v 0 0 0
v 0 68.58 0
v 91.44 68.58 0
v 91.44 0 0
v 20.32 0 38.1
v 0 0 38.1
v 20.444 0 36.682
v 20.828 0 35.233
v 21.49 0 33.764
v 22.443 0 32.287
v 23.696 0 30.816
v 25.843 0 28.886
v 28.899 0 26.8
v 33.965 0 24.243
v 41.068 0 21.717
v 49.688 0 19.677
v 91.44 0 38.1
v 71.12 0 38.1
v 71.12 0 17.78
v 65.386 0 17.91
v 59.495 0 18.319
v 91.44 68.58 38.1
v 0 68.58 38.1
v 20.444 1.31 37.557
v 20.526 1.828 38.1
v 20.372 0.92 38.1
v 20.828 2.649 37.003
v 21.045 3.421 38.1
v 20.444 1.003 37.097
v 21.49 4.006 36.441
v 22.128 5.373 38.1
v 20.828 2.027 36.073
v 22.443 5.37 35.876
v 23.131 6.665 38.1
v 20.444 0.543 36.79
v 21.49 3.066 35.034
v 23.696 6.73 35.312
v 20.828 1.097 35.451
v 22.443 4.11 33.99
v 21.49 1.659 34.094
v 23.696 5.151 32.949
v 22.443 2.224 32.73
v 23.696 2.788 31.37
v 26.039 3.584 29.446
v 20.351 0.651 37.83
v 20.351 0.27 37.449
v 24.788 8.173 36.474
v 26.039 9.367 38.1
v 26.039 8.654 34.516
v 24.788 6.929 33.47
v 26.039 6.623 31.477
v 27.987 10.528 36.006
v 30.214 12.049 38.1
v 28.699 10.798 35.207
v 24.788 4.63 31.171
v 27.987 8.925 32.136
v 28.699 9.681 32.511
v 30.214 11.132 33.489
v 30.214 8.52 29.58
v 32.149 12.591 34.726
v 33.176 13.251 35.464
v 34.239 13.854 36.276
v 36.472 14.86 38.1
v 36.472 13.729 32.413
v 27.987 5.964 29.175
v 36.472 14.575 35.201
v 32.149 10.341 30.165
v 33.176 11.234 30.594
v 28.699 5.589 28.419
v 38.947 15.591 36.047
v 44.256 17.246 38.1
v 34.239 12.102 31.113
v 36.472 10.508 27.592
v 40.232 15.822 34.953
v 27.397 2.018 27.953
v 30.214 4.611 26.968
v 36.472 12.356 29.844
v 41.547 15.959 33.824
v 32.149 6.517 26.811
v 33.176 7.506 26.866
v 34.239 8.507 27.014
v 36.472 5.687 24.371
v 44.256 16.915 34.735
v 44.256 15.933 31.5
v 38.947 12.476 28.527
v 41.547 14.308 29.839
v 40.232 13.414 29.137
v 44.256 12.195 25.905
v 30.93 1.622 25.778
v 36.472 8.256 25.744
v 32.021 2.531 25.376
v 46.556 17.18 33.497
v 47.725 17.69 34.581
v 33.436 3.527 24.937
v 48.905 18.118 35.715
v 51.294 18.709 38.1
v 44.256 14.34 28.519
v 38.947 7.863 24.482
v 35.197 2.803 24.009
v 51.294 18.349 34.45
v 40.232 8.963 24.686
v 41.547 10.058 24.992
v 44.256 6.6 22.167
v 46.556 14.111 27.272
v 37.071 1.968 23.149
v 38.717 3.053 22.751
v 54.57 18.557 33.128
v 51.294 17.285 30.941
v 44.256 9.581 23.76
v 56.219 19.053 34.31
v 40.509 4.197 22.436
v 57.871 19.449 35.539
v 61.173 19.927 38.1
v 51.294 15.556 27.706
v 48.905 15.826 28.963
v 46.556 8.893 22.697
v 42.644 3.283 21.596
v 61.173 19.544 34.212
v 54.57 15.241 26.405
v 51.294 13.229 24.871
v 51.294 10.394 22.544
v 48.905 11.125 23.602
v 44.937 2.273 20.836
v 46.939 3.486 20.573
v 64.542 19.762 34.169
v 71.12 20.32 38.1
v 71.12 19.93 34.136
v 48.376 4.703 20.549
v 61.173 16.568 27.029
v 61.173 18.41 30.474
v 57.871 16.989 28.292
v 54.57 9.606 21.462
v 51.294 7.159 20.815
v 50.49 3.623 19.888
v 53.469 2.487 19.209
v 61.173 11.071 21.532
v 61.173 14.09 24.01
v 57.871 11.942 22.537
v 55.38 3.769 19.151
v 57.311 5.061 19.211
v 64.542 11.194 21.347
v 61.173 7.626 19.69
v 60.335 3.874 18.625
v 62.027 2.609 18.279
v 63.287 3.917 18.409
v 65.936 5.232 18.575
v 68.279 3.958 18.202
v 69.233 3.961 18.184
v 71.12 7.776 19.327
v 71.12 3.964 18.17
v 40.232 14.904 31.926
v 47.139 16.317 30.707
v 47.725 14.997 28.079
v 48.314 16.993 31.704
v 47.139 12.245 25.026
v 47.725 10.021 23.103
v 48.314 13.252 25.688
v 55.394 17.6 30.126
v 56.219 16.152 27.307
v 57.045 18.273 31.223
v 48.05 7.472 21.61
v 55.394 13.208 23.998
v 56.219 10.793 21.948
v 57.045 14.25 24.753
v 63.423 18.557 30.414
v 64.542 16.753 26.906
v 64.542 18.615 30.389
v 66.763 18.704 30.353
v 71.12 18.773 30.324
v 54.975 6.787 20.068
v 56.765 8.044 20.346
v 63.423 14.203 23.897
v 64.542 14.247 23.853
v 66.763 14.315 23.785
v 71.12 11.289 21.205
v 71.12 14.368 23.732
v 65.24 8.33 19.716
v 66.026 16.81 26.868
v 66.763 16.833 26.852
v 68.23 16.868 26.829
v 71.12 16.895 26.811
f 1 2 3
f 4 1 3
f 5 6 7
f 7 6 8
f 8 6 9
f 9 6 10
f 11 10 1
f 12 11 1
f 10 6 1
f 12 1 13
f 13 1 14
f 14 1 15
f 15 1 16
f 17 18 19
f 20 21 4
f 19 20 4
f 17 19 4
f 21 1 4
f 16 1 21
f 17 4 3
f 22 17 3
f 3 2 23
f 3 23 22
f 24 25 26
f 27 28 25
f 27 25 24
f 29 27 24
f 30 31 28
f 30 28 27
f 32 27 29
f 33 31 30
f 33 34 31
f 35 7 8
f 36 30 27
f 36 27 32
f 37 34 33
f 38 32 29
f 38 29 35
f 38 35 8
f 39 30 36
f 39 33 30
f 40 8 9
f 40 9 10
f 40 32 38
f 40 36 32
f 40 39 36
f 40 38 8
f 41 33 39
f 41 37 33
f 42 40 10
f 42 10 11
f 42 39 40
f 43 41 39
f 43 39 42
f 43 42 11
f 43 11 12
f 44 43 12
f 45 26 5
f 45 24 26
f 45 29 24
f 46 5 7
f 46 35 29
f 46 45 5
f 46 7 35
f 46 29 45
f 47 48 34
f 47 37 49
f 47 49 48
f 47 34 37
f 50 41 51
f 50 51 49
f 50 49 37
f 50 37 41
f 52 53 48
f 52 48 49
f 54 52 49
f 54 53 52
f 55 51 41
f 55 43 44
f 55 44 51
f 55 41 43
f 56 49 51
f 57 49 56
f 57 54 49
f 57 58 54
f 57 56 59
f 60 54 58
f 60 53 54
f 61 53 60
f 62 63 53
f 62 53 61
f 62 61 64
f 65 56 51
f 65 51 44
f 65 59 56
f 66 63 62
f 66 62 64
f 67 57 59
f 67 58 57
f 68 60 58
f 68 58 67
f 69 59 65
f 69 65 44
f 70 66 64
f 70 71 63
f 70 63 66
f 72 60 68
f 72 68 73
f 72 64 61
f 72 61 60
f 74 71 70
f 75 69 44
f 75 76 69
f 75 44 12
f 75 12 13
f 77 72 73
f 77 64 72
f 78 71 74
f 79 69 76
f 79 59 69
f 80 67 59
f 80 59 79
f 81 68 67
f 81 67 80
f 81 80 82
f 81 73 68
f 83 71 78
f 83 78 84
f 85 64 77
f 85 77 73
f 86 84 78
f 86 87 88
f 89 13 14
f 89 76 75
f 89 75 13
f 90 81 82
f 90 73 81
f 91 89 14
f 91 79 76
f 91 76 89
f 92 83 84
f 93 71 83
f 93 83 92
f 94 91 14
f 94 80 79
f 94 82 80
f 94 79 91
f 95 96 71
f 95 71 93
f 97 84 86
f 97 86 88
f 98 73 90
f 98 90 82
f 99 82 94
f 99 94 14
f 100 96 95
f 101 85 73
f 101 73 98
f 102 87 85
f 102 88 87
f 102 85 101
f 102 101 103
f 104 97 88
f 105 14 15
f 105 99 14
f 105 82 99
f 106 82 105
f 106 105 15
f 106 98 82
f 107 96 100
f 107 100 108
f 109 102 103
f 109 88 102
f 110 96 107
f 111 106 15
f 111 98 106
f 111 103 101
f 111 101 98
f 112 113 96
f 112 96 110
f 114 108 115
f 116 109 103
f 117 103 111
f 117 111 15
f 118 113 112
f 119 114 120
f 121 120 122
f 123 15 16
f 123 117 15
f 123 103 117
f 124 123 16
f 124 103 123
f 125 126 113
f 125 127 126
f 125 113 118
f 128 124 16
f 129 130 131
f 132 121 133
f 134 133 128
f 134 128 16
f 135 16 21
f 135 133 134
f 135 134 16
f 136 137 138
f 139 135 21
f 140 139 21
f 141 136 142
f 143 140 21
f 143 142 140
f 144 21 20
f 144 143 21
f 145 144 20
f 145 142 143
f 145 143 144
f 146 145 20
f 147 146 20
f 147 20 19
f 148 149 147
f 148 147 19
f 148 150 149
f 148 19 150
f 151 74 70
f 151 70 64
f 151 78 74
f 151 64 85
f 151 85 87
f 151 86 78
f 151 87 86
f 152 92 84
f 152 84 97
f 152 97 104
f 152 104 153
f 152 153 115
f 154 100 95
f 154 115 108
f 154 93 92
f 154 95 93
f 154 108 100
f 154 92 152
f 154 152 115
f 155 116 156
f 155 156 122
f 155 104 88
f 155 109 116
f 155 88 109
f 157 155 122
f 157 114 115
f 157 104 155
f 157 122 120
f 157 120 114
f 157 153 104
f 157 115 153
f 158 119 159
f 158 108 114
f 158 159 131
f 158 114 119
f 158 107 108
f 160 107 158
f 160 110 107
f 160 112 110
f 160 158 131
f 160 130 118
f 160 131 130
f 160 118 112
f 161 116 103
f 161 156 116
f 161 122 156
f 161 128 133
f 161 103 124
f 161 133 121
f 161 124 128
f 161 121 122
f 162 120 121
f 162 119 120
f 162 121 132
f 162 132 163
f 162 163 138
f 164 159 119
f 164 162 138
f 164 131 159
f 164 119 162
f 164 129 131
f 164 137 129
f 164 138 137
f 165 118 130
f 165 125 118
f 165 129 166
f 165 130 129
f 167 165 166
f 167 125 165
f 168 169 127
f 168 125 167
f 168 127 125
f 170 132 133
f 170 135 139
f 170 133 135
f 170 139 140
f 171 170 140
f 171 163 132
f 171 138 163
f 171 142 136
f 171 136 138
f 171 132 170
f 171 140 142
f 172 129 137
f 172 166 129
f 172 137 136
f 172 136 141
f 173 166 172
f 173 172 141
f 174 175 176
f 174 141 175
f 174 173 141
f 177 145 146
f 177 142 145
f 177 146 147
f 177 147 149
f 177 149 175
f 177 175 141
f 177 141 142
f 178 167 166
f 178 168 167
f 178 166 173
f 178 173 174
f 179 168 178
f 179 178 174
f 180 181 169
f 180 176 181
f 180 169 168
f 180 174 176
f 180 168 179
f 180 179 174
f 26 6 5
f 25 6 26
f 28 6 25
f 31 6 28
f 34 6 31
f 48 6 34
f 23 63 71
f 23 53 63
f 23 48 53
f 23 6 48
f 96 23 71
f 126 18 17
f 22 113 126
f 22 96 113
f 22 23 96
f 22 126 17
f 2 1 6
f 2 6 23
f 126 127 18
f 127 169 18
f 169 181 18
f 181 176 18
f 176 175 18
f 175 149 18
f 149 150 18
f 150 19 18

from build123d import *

# Parameters (mm, degrees)
SKETCH1_W           = 91.44
SKETCH1_H           = 68.58
BOSS_EXTRUDE1_DEPTH = 38.1


with BuildPart() as part:
    # Sketch1 → Boss-Extrude1 (new body)
    with BuildSketch(Plane.XY):
        with Locations((45.72, 34.29)):
            Rectangle(SKETCH1_W, SKETCH1_H)
    extrude(amount=BOSS_EXTRUDE1_DEPTH)

    # Sketch4 → Cut-Revolve2 (revolve, cut)
    with BuildSketch(Plane(origin=(0, 0, 0), x_dir=(-1, 0, 0), z_dir=(0, -1, 0))):
        with BuildLine():
            Line((-71.12, -38.1), (-71.12, -17.78))
            add(Edge.make_bspline(
                [(-20.32, -38.1), (-20.32, -17.78), (-71.12, -17.78)],
                knots=[3.141592654, 3.141592654, 3.141592654, 4.71238898, 4.71238898, 4.71238898], degree=2, weights=[1, 0.707106781, 1]))
            Line((-20.32, -38.1), (-71.12, -38.1))
        make_face()
    revolve(axis=Axis((71.12, 0, 38.1), (-1, 0, 0)), mode=Mode.SUBTRACT)


solid = part.part
